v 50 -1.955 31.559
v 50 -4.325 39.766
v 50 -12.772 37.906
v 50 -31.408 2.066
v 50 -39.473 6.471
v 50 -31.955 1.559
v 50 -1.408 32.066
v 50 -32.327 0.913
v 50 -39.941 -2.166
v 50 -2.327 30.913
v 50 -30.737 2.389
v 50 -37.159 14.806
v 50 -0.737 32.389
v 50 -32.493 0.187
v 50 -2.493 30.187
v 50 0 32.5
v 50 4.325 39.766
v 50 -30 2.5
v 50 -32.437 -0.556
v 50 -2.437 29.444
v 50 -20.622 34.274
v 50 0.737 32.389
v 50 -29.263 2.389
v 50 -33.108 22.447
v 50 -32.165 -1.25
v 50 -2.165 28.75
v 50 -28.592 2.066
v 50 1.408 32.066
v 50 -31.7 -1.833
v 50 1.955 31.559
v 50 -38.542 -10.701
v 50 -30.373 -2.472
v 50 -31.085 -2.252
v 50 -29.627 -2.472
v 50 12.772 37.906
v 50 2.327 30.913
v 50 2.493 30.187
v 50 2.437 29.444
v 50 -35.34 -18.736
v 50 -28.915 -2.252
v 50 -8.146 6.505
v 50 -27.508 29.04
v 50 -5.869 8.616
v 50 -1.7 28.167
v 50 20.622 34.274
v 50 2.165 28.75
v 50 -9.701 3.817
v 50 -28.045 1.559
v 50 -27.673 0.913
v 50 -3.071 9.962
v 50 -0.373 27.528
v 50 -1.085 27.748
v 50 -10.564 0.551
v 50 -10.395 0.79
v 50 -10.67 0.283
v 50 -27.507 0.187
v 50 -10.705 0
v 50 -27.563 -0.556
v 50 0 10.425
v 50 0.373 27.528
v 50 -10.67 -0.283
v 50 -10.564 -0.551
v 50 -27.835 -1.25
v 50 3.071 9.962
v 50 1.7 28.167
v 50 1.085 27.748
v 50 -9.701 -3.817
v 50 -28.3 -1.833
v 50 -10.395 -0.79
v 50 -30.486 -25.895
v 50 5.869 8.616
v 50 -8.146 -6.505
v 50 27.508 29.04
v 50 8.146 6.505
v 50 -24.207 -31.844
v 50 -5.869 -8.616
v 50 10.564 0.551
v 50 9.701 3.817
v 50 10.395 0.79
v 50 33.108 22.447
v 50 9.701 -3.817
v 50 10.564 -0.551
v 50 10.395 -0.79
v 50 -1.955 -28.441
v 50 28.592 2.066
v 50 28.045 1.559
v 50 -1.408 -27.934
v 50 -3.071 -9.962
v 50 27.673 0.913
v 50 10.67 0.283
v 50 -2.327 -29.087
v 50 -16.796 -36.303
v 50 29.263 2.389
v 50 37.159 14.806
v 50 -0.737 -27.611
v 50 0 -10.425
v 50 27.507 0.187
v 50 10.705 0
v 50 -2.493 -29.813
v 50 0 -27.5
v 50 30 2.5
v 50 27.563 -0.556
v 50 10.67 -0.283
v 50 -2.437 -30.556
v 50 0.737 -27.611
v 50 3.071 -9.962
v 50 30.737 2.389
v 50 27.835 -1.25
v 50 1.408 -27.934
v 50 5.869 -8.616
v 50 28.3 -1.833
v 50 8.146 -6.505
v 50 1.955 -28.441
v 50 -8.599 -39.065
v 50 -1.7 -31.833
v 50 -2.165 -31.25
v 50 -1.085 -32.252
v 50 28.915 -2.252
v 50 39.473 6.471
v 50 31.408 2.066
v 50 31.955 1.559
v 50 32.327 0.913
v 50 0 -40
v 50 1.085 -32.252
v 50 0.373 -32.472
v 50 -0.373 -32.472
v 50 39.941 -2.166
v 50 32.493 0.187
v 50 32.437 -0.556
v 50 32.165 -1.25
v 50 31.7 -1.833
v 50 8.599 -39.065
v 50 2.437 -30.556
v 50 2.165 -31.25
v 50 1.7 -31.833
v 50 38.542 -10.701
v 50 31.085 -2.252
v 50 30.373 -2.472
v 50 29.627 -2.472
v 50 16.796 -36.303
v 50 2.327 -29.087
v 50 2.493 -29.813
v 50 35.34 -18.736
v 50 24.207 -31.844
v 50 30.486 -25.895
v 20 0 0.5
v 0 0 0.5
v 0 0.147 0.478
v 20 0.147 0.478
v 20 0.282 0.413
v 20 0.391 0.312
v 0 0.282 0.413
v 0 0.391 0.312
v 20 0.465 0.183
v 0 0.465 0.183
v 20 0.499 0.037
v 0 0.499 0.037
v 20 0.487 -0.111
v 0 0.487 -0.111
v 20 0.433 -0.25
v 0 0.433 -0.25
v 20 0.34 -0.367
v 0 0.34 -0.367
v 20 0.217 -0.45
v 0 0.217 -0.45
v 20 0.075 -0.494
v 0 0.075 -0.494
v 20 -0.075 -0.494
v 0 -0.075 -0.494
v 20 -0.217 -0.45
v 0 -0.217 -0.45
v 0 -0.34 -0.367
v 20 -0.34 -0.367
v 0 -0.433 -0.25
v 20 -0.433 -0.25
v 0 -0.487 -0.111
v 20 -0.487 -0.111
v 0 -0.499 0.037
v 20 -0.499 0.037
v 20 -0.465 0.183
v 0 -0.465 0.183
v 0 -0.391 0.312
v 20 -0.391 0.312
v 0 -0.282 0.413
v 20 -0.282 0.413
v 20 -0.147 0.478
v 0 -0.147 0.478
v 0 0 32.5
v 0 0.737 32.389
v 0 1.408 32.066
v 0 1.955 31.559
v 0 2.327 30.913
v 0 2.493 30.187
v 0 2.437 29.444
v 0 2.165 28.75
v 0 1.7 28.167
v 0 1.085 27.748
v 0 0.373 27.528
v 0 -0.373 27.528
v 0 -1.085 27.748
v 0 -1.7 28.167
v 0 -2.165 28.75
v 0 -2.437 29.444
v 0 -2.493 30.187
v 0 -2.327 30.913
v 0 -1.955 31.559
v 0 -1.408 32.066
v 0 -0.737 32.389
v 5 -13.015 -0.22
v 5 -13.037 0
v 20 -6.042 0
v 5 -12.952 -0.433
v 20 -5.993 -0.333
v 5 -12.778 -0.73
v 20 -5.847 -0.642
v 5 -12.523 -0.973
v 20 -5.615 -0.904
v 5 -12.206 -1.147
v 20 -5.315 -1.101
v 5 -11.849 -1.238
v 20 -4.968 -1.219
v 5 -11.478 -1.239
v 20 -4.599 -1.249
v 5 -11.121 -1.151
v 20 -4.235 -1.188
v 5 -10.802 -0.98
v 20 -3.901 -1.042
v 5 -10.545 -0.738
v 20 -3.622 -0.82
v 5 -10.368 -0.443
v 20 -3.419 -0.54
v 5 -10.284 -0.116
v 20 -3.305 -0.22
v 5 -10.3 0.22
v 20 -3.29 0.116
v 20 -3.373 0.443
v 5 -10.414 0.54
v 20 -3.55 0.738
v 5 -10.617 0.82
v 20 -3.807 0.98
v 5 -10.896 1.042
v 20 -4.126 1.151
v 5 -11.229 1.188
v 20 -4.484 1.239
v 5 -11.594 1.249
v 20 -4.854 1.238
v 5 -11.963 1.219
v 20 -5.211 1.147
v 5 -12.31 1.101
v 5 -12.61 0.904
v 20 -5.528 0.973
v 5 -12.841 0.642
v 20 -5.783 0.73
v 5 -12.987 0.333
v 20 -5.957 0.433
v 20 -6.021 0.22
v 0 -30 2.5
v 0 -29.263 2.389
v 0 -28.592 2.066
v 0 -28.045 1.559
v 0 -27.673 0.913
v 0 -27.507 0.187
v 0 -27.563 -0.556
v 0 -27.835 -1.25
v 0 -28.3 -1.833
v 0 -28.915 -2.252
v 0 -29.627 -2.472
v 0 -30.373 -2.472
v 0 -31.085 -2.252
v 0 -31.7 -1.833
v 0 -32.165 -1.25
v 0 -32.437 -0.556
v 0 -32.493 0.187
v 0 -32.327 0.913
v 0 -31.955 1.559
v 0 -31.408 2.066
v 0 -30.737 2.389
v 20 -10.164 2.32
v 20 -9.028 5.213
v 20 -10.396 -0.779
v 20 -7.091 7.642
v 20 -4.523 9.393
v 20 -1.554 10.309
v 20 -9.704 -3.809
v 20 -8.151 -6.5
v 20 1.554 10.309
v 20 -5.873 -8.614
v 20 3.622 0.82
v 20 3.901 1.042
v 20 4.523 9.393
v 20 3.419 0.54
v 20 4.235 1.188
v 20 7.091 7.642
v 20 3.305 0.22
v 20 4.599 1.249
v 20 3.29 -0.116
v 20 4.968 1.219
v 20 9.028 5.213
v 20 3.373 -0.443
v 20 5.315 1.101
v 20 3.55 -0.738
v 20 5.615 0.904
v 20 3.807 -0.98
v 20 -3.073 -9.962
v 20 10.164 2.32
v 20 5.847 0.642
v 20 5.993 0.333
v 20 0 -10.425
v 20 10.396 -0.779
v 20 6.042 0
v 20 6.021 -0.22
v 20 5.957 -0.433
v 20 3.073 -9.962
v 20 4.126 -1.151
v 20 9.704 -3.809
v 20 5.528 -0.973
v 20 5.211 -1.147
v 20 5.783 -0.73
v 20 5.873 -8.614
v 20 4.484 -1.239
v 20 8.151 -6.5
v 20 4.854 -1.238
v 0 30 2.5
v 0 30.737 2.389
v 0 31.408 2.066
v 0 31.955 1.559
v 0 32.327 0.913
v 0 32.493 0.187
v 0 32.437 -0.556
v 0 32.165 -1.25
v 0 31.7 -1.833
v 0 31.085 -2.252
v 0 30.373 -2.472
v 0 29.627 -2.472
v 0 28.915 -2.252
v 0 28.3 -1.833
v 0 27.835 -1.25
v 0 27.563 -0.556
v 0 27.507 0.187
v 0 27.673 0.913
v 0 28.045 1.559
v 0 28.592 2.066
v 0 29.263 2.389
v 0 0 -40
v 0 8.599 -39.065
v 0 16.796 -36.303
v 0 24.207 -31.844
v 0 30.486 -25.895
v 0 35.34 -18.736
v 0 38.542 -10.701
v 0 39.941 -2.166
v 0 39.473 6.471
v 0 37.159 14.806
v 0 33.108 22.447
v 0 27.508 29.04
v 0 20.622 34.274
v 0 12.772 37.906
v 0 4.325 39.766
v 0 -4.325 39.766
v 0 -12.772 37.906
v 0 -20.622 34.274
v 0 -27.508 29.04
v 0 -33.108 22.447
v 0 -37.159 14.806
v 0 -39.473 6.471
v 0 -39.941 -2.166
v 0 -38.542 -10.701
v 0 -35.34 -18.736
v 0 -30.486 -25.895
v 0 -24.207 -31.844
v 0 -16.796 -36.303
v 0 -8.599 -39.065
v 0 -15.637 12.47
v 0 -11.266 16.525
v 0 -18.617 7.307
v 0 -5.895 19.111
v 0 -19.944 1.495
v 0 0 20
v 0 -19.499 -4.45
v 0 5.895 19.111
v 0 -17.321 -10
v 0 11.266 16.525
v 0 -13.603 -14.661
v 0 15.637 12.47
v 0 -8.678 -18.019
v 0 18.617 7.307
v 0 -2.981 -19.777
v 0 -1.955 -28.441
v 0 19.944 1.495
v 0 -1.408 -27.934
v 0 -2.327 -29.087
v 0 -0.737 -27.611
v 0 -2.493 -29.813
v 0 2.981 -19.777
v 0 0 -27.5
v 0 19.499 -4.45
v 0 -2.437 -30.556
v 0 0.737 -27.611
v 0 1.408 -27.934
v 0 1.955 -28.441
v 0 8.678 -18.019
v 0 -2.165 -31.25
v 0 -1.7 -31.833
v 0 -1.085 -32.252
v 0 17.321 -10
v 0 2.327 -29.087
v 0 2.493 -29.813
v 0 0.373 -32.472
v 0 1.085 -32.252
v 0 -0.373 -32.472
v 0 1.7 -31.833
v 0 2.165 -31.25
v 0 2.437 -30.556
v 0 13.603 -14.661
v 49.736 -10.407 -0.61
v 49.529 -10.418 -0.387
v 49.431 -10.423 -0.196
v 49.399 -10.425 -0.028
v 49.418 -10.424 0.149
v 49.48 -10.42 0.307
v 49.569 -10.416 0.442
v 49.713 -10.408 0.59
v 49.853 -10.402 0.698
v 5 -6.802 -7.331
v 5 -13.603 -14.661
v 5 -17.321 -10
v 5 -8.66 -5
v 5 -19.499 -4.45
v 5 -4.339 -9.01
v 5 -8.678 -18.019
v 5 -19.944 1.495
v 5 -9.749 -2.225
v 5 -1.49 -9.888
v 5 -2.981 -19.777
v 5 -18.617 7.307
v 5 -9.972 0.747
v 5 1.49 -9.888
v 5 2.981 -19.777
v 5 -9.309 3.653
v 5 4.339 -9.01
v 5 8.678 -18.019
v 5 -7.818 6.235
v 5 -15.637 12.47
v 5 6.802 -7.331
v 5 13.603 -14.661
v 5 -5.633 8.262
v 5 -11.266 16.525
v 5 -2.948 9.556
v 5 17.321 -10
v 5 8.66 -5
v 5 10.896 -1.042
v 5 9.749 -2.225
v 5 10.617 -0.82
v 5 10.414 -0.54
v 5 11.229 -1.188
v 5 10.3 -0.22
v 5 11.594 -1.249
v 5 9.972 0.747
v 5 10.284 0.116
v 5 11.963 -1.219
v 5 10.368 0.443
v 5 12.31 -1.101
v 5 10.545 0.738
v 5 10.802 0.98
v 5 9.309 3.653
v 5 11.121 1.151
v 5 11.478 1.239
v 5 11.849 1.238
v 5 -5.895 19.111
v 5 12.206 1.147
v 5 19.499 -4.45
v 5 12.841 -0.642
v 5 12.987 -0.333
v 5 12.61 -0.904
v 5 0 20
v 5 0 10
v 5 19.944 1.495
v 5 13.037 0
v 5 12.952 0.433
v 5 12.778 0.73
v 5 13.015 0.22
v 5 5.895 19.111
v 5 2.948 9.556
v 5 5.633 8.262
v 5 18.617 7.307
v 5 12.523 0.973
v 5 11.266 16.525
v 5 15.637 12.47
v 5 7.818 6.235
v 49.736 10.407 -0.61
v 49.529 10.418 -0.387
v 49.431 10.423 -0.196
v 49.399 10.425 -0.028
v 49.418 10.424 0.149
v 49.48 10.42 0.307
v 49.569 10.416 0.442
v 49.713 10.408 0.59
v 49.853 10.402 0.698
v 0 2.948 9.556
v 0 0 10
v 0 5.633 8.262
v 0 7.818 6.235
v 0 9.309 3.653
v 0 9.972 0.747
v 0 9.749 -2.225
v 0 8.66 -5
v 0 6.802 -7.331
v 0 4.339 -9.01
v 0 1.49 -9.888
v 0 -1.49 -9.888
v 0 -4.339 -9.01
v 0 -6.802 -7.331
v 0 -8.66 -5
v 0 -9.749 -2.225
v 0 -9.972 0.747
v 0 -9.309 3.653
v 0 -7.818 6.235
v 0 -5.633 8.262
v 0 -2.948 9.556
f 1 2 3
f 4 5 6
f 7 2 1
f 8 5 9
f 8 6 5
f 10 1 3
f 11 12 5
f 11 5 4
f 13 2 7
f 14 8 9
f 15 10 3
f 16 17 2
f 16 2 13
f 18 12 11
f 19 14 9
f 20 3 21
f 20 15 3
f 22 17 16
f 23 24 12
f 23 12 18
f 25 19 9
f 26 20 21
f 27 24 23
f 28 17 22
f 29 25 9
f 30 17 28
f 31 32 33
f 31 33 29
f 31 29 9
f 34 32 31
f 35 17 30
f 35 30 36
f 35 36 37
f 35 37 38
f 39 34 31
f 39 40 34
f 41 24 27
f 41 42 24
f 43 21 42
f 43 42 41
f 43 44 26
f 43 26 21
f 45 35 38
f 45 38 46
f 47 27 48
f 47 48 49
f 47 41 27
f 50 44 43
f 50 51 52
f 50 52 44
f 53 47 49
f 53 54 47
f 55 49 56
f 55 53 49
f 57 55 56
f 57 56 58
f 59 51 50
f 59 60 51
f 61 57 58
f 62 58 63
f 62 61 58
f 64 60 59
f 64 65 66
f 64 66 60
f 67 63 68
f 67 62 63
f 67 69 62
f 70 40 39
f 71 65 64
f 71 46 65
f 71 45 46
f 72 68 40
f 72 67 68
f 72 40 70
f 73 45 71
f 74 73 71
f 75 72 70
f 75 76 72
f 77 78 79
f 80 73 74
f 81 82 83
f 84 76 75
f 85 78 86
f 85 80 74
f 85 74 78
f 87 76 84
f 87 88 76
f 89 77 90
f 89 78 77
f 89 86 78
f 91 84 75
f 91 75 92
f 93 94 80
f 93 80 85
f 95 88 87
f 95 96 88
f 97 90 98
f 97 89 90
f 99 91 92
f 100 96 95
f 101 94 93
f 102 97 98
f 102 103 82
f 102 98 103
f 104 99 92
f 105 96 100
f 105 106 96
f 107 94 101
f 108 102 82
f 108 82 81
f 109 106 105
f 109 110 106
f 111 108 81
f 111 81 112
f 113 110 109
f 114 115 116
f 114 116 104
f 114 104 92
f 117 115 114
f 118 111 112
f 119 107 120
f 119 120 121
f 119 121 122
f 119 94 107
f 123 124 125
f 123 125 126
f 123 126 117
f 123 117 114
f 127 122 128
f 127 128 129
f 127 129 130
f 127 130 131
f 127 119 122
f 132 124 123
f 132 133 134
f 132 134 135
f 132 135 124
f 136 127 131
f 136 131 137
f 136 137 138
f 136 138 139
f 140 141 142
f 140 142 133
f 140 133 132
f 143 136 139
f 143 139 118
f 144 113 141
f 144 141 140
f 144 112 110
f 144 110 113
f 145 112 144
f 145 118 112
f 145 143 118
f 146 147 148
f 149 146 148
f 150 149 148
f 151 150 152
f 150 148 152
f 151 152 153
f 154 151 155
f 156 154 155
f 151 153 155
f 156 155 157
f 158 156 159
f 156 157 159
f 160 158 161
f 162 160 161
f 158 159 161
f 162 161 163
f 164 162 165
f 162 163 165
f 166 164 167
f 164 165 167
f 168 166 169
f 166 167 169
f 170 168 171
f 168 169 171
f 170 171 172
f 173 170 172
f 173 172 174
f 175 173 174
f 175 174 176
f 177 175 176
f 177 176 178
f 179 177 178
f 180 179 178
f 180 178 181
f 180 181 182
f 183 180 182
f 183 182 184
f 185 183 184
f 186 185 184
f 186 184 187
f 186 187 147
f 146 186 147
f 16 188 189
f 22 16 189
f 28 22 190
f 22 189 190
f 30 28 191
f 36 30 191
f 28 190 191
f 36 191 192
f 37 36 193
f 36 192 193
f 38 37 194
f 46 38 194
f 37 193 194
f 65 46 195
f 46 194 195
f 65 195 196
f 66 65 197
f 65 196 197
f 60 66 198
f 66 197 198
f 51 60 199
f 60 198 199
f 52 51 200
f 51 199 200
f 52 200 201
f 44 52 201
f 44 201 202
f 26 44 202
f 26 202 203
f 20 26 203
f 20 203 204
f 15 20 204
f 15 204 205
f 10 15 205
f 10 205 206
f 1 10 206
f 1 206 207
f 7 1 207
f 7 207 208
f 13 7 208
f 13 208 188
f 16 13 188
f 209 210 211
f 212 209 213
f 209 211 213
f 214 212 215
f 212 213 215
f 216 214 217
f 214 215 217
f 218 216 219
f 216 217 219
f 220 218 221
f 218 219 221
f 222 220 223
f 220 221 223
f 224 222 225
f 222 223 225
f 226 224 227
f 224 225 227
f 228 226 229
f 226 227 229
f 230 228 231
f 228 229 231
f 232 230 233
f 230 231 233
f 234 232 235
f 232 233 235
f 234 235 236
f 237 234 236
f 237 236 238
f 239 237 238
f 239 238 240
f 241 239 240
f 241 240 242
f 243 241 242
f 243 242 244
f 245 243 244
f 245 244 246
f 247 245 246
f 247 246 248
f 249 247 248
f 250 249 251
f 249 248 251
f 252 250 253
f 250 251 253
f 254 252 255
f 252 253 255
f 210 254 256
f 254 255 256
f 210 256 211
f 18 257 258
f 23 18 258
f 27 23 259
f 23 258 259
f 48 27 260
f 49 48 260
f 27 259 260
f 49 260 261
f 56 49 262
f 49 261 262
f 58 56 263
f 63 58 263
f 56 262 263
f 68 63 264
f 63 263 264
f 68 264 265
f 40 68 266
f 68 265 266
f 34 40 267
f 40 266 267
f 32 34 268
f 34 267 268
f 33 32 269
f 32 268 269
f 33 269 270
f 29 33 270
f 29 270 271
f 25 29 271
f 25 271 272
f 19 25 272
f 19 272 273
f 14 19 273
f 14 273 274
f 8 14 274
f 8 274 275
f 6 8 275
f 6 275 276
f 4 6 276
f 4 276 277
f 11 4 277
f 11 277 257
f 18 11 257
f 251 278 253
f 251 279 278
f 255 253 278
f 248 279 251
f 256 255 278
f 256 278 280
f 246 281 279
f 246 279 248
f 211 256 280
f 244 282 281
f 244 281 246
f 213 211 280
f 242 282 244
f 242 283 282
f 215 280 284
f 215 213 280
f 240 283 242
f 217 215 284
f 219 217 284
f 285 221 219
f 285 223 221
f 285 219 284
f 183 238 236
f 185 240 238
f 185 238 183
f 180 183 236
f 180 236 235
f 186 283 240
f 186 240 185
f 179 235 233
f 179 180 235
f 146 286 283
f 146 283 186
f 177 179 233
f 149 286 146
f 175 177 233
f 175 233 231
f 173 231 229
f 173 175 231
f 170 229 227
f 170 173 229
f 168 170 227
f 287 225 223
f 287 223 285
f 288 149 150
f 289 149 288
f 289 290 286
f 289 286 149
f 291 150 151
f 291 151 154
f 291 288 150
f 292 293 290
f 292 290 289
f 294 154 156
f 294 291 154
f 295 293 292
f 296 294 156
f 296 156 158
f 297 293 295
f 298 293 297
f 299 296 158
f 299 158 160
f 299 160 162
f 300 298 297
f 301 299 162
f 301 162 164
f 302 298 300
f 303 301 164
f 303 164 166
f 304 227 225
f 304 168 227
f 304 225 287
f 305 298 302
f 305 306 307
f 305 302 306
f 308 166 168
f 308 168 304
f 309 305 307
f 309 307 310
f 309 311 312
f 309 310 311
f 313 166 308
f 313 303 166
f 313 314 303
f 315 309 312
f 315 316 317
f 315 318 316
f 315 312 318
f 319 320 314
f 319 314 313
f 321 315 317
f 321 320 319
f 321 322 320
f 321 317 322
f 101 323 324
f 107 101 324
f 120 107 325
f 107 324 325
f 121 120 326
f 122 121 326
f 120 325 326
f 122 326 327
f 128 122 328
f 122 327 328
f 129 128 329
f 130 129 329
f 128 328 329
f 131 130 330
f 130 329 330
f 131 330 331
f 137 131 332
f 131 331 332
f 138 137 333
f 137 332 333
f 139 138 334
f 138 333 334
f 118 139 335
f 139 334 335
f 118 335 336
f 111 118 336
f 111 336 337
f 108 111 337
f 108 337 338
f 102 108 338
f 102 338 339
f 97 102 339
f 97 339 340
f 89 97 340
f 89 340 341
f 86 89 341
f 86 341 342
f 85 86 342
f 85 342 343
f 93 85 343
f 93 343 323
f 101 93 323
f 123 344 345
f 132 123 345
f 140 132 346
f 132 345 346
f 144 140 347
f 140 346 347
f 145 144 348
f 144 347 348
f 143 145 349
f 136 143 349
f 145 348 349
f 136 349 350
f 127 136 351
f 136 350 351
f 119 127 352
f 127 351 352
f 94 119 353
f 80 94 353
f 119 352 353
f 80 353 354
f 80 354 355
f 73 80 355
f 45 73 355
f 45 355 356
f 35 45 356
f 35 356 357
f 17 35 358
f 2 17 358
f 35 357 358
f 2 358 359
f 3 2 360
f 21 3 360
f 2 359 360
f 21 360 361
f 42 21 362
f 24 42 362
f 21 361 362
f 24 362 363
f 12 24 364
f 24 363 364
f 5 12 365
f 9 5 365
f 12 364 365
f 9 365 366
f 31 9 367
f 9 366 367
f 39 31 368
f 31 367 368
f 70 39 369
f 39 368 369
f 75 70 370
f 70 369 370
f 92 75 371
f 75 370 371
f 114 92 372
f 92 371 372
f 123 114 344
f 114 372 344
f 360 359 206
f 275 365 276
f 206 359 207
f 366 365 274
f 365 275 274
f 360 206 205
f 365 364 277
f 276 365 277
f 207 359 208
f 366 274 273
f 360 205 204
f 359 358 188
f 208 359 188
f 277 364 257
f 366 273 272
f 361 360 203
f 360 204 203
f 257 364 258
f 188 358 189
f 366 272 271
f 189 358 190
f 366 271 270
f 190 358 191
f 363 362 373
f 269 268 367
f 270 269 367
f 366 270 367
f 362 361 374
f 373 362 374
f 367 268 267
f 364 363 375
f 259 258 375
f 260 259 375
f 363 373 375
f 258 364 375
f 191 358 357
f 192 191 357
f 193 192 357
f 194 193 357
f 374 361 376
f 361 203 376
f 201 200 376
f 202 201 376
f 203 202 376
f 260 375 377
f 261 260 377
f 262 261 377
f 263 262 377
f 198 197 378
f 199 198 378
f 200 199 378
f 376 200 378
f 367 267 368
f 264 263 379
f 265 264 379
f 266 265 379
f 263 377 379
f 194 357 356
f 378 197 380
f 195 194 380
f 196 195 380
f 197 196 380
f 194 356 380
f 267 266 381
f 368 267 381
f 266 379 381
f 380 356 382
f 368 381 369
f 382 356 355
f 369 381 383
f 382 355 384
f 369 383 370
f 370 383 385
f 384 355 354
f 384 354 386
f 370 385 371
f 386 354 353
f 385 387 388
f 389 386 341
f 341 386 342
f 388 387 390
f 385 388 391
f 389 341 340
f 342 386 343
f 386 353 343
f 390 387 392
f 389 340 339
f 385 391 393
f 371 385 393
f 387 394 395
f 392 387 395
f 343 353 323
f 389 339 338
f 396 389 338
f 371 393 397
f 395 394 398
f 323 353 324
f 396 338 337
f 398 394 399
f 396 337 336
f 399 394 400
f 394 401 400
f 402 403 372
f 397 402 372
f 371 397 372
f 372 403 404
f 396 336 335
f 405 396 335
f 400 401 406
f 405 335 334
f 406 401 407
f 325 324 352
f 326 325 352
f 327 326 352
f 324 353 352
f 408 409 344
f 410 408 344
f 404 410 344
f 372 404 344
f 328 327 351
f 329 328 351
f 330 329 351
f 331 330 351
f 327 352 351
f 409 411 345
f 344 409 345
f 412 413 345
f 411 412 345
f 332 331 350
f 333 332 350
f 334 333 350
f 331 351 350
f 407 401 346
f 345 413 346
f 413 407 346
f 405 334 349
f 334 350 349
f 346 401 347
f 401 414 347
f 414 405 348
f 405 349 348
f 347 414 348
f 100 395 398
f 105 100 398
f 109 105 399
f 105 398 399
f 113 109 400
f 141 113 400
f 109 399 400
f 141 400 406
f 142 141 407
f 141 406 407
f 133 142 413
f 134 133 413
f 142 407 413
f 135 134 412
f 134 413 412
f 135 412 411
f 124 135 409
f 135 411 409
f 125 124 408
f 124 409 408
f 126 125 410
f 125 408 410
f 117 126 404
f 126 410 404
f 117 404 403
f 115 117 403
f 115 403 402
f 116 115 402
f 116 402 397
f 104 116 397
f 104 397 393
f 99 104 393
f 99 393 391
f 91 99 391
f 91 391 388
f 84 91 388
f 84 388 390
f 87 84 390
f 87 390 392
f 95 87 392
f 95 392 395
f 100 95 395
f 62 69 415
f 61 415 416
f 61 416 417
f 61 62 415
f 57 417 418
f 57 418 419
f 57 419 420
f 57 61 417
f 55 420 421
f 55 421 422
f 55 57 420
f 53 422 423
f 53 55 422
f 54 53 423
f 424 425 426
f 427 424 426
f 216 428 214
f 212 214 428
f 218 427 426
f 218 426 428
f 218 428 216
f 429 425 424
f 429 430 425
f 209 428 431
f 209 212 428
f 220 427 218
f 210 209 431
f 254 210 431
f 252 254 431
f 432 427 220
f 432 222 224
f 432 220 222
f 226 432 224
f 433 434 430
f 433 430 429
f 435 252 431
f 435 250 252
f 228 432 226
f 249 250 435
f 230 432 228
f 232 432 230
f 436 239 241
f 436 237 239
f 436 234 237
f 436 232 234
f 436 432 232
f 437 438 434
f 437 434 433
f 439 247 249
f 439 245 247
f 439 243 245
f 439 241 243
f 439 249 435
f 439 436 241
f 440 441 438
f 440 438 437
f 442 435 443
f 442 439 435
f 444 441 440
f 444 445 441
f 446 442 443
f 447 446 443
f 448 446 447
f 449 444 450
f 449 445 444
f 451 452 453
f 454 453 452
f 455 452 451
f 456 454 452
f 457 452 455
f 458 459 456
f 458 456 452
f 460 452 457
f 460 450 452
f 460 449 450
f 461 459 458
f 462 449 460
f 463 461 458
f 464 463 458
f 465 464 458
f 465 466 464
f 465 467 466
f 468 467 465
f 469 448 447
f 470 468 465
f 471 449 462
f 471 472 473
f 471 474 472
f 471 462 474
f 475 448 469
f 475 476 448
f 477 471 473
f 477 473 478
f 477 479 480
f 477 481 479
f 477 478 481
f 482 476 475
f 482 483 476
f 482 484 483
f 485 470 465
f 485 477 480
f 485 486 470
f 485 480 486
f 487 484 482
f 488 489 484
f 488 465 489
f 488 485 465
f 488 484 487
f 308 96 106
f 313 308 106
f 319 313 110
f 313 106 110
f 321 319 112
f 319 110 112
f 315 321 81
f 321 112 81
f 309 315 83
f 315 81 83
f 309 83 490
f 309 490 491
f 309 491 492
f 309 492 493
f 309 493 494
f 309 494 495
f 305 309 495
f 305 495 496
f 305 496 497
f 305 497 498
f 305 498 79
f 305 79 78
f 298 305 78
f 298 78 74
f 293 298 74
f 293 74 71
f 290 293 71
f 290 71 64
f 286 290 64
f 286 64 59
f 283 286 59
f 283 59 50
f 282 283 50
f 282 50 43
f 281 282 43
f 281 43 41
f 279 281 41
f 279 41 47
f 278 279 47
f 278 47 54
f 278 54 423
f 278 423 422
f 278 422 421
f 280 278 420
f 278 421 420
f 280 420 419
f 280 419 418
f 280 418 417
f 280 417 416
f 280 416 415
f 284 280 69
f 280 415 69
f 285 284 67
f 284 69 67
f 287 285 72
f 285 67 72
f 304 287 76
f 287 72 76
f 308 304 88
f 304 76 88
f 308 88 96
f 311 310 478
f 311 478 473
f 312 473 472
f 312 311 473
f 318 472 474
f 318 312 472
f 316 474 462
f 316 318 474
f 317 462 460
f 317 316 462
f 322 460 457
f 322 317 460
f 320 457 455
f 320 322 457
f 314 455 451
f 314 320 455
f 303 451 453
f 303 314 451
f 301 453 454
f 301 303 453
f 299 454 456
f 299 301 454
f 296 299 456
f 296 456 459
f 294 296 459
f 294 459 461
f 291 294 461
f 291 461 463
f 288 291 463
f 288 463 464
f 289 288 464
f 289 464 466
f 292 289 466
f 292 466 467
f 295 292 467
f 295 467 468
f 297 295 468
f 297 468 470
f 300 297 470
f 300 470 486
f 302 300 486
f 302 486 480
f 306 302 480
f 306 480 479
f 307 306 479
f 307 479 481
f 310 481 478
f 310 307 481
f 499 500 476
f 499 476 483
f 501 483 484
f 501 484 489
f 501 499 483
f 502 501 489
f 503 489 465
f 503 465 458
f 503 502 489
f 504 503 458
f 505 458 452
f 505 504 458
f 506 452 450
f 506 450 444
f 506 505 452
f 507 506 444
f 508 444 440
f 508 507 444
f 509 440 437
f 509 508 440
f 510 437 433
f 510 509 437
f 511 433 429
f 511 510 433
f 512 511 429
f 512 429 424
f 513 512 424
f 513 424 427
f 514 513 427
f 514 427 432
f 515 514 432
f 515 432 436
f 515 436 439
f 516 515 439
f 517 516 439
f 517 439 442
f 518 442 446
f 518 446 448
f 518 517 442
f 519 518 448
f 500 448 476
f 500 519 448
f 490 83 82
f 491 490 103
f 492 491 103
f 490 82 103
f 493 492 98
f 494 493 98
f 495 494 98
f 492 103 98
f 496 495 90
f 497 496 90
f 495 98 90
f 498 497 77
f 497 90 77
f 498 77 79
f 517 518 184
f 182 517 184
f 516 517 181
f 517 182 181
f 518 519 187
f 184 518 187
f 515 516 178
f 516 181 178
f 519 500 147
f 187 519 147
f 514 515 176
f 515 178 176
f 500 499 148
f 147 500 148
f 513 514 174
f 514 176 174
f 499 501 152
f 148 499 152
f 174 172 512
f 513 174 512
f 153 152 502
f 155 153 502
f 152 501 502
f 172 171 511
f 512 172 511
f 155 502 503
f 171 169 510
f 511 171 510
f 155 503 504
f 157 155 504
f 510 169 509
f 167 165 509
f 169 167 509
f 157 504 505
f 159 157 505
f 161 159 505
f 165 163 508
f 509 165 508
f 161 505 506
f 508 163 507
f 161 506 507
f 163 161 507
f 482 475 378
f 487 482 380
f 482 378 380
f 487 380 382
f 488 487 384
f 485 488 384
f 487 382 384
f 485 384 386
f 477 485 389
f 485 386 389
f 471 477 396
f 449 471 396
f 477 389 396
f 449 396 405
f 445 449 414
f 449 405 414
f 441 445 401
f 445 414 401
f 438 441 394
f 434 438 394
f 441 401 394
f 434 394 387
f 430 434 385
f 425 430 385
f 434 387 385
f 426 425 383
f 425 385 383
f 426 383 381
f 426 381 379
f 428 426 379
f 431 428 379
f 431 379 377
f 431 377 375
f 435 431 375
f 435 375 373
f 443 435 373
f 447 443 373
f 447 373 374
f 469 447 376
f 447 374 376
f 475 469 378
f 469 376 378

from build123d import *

# Parameters (mm, degrees)
SKETCH1_R                                  = 40
BOSS_EXTRUDE1_DEPTH                        = 50
SKETCH2_R                                  = 10.425
CUT_EXTRUDE1_DEPTH                         = 30
SKETCH3_R                                  = 20
SKETCH3_R_2                                = 10
CUT_EXTRUDE2_DEPTH                         = 5
SKETCH4_R                                  = 0.5
CUT_EXTRUDE3_DEPTH                         = 76.498344353
SKETCH5_R                                  = 2.5
CUT_EXTRUDE4_DEPTH                         = 76.498344353
CUT_EXTRUDE5_START                         = -49.839677
SKETCH7_R                                  = 1.25
CUT_EXTRUDE5_DEPTH                         = 50.817776
MIRROR1_START                              = -49.839677
MIRROR1_AT_THE_SECOND_PLANE_COPY_1_SKETC_R = 1.25
MIRROR1_AT_THE_SECOND_PLANE_COPY_1_DEPTH   = 50.817776


with BuildPart() as part:
    # Sketch1 → Boss-Extrude1 (new body)
    with BuildSketch(Plane(origin=(0, 0, 0), x_dir=(0, 0, -1), z_dir=(1, 0, 0))):
        Circle(SKETCH1_R)
    extrude(amount=BOSS_EXTRUDE1_DEPTH)

    # Sketch2 → Cut-Extrude1 (cut)
    with BuildSketch(Plane(origin=(50, 0, 0), x_dir=(0, 0, -1), z_dir=(1, 0, 0))):
        Circle(SKETCH2_R)
    extrude(amount=-CUT_EXTRUDE1_DEPTH, mode=Mode.SUBTRACT)

    # Sketch3 → Cut-Extrude2 (cut)
    with BuildSketch(Plane.ZY):
        Circle(SKETCH3_R)
        Circle(SKETCH3_R_2, mode=Mode.SUBTRACT)
    extrude(amount=-CUT_EXTRUDE2_DEPTH, mode=Mode.SUBTRACT)

    # Sketch4 → Cut-Extrude3 (cut, through all)
    with BuildSketch(Plane.ZY):
        Circle(SKETCH4_R)
    extrude(amount=-CUT_EXTRUDE3_DEPTH, mode=Mode.SUBTRACT)

    # Sketch5 → Cut-Extrude4 (cut, through all)
    with BuildSketch(Plane.ZY):
        with Locations((0, 30)):
            Circle(SKETCH5_R)
        with Locations((30, 0)):
            Circle(SKETCH5_R)
        with Locations((0, -30)):
            Circle(SKETCH5_R)
        with Locations((-30, 0)):
            Circle(SKETCH5_R)
    extrude(amount=-CUT_EXTRUDE4_DEPTH, mode=Mode.SUBTRACT)

    # Sketch7 → Cut-Extrude5 (cut)
    with BuildSketch(Plane(origin=(0, 0, 0), x_dir=(0, 0, 1), z_dir=(-0.9063077870366496, 0.42261826174070033, 0)).offset(CUT_EXTRUDE5_START)):
        with Locations(Location((0, 12.678547852, 0), (0, 0, 90))):
            Circle(SKETCH7_R)
    cut_extrude5 = extrude(amount=CUT_EXTRUDE5_DEPTH, mode=Mode.SUBTRACT)

    # Mirror1: Cut-Extrude5 across plane
    add(cut_extrude5.mirror(Plane.ZX), mode=Mode.SUBTRACT)

    # Mirror1 at the second plane: Cut-Extrude5 across plane
    add(cut_extrude5.mirror(Plane.XY), mode=Mode.SUBTRACT)

    # Mirror1 at the second plane copy 1 sketc → Mirror1 at the second plane copy 1 (cut)
    with BuildSketch(Plane(origin=(0, 0, 0), x_dir=(0, 0, -1), z_dir=(-0.9063077870366496, -0.42261826174070033, 0)).offset(MIRROR1_START)):
        with Locations(Location((0, 12.678547852, 0), (0, 0, 90))):
            Circle(MIRROR1_AT_THE_SECOND_PLANE_COPY_1_SKETC_R)
    extrude(amount=MIRROR1_AT_THE_SECOND_PLANE_COPY_1_DEPTH, mode=Mode.SUBTRACT)


solid = part.part
